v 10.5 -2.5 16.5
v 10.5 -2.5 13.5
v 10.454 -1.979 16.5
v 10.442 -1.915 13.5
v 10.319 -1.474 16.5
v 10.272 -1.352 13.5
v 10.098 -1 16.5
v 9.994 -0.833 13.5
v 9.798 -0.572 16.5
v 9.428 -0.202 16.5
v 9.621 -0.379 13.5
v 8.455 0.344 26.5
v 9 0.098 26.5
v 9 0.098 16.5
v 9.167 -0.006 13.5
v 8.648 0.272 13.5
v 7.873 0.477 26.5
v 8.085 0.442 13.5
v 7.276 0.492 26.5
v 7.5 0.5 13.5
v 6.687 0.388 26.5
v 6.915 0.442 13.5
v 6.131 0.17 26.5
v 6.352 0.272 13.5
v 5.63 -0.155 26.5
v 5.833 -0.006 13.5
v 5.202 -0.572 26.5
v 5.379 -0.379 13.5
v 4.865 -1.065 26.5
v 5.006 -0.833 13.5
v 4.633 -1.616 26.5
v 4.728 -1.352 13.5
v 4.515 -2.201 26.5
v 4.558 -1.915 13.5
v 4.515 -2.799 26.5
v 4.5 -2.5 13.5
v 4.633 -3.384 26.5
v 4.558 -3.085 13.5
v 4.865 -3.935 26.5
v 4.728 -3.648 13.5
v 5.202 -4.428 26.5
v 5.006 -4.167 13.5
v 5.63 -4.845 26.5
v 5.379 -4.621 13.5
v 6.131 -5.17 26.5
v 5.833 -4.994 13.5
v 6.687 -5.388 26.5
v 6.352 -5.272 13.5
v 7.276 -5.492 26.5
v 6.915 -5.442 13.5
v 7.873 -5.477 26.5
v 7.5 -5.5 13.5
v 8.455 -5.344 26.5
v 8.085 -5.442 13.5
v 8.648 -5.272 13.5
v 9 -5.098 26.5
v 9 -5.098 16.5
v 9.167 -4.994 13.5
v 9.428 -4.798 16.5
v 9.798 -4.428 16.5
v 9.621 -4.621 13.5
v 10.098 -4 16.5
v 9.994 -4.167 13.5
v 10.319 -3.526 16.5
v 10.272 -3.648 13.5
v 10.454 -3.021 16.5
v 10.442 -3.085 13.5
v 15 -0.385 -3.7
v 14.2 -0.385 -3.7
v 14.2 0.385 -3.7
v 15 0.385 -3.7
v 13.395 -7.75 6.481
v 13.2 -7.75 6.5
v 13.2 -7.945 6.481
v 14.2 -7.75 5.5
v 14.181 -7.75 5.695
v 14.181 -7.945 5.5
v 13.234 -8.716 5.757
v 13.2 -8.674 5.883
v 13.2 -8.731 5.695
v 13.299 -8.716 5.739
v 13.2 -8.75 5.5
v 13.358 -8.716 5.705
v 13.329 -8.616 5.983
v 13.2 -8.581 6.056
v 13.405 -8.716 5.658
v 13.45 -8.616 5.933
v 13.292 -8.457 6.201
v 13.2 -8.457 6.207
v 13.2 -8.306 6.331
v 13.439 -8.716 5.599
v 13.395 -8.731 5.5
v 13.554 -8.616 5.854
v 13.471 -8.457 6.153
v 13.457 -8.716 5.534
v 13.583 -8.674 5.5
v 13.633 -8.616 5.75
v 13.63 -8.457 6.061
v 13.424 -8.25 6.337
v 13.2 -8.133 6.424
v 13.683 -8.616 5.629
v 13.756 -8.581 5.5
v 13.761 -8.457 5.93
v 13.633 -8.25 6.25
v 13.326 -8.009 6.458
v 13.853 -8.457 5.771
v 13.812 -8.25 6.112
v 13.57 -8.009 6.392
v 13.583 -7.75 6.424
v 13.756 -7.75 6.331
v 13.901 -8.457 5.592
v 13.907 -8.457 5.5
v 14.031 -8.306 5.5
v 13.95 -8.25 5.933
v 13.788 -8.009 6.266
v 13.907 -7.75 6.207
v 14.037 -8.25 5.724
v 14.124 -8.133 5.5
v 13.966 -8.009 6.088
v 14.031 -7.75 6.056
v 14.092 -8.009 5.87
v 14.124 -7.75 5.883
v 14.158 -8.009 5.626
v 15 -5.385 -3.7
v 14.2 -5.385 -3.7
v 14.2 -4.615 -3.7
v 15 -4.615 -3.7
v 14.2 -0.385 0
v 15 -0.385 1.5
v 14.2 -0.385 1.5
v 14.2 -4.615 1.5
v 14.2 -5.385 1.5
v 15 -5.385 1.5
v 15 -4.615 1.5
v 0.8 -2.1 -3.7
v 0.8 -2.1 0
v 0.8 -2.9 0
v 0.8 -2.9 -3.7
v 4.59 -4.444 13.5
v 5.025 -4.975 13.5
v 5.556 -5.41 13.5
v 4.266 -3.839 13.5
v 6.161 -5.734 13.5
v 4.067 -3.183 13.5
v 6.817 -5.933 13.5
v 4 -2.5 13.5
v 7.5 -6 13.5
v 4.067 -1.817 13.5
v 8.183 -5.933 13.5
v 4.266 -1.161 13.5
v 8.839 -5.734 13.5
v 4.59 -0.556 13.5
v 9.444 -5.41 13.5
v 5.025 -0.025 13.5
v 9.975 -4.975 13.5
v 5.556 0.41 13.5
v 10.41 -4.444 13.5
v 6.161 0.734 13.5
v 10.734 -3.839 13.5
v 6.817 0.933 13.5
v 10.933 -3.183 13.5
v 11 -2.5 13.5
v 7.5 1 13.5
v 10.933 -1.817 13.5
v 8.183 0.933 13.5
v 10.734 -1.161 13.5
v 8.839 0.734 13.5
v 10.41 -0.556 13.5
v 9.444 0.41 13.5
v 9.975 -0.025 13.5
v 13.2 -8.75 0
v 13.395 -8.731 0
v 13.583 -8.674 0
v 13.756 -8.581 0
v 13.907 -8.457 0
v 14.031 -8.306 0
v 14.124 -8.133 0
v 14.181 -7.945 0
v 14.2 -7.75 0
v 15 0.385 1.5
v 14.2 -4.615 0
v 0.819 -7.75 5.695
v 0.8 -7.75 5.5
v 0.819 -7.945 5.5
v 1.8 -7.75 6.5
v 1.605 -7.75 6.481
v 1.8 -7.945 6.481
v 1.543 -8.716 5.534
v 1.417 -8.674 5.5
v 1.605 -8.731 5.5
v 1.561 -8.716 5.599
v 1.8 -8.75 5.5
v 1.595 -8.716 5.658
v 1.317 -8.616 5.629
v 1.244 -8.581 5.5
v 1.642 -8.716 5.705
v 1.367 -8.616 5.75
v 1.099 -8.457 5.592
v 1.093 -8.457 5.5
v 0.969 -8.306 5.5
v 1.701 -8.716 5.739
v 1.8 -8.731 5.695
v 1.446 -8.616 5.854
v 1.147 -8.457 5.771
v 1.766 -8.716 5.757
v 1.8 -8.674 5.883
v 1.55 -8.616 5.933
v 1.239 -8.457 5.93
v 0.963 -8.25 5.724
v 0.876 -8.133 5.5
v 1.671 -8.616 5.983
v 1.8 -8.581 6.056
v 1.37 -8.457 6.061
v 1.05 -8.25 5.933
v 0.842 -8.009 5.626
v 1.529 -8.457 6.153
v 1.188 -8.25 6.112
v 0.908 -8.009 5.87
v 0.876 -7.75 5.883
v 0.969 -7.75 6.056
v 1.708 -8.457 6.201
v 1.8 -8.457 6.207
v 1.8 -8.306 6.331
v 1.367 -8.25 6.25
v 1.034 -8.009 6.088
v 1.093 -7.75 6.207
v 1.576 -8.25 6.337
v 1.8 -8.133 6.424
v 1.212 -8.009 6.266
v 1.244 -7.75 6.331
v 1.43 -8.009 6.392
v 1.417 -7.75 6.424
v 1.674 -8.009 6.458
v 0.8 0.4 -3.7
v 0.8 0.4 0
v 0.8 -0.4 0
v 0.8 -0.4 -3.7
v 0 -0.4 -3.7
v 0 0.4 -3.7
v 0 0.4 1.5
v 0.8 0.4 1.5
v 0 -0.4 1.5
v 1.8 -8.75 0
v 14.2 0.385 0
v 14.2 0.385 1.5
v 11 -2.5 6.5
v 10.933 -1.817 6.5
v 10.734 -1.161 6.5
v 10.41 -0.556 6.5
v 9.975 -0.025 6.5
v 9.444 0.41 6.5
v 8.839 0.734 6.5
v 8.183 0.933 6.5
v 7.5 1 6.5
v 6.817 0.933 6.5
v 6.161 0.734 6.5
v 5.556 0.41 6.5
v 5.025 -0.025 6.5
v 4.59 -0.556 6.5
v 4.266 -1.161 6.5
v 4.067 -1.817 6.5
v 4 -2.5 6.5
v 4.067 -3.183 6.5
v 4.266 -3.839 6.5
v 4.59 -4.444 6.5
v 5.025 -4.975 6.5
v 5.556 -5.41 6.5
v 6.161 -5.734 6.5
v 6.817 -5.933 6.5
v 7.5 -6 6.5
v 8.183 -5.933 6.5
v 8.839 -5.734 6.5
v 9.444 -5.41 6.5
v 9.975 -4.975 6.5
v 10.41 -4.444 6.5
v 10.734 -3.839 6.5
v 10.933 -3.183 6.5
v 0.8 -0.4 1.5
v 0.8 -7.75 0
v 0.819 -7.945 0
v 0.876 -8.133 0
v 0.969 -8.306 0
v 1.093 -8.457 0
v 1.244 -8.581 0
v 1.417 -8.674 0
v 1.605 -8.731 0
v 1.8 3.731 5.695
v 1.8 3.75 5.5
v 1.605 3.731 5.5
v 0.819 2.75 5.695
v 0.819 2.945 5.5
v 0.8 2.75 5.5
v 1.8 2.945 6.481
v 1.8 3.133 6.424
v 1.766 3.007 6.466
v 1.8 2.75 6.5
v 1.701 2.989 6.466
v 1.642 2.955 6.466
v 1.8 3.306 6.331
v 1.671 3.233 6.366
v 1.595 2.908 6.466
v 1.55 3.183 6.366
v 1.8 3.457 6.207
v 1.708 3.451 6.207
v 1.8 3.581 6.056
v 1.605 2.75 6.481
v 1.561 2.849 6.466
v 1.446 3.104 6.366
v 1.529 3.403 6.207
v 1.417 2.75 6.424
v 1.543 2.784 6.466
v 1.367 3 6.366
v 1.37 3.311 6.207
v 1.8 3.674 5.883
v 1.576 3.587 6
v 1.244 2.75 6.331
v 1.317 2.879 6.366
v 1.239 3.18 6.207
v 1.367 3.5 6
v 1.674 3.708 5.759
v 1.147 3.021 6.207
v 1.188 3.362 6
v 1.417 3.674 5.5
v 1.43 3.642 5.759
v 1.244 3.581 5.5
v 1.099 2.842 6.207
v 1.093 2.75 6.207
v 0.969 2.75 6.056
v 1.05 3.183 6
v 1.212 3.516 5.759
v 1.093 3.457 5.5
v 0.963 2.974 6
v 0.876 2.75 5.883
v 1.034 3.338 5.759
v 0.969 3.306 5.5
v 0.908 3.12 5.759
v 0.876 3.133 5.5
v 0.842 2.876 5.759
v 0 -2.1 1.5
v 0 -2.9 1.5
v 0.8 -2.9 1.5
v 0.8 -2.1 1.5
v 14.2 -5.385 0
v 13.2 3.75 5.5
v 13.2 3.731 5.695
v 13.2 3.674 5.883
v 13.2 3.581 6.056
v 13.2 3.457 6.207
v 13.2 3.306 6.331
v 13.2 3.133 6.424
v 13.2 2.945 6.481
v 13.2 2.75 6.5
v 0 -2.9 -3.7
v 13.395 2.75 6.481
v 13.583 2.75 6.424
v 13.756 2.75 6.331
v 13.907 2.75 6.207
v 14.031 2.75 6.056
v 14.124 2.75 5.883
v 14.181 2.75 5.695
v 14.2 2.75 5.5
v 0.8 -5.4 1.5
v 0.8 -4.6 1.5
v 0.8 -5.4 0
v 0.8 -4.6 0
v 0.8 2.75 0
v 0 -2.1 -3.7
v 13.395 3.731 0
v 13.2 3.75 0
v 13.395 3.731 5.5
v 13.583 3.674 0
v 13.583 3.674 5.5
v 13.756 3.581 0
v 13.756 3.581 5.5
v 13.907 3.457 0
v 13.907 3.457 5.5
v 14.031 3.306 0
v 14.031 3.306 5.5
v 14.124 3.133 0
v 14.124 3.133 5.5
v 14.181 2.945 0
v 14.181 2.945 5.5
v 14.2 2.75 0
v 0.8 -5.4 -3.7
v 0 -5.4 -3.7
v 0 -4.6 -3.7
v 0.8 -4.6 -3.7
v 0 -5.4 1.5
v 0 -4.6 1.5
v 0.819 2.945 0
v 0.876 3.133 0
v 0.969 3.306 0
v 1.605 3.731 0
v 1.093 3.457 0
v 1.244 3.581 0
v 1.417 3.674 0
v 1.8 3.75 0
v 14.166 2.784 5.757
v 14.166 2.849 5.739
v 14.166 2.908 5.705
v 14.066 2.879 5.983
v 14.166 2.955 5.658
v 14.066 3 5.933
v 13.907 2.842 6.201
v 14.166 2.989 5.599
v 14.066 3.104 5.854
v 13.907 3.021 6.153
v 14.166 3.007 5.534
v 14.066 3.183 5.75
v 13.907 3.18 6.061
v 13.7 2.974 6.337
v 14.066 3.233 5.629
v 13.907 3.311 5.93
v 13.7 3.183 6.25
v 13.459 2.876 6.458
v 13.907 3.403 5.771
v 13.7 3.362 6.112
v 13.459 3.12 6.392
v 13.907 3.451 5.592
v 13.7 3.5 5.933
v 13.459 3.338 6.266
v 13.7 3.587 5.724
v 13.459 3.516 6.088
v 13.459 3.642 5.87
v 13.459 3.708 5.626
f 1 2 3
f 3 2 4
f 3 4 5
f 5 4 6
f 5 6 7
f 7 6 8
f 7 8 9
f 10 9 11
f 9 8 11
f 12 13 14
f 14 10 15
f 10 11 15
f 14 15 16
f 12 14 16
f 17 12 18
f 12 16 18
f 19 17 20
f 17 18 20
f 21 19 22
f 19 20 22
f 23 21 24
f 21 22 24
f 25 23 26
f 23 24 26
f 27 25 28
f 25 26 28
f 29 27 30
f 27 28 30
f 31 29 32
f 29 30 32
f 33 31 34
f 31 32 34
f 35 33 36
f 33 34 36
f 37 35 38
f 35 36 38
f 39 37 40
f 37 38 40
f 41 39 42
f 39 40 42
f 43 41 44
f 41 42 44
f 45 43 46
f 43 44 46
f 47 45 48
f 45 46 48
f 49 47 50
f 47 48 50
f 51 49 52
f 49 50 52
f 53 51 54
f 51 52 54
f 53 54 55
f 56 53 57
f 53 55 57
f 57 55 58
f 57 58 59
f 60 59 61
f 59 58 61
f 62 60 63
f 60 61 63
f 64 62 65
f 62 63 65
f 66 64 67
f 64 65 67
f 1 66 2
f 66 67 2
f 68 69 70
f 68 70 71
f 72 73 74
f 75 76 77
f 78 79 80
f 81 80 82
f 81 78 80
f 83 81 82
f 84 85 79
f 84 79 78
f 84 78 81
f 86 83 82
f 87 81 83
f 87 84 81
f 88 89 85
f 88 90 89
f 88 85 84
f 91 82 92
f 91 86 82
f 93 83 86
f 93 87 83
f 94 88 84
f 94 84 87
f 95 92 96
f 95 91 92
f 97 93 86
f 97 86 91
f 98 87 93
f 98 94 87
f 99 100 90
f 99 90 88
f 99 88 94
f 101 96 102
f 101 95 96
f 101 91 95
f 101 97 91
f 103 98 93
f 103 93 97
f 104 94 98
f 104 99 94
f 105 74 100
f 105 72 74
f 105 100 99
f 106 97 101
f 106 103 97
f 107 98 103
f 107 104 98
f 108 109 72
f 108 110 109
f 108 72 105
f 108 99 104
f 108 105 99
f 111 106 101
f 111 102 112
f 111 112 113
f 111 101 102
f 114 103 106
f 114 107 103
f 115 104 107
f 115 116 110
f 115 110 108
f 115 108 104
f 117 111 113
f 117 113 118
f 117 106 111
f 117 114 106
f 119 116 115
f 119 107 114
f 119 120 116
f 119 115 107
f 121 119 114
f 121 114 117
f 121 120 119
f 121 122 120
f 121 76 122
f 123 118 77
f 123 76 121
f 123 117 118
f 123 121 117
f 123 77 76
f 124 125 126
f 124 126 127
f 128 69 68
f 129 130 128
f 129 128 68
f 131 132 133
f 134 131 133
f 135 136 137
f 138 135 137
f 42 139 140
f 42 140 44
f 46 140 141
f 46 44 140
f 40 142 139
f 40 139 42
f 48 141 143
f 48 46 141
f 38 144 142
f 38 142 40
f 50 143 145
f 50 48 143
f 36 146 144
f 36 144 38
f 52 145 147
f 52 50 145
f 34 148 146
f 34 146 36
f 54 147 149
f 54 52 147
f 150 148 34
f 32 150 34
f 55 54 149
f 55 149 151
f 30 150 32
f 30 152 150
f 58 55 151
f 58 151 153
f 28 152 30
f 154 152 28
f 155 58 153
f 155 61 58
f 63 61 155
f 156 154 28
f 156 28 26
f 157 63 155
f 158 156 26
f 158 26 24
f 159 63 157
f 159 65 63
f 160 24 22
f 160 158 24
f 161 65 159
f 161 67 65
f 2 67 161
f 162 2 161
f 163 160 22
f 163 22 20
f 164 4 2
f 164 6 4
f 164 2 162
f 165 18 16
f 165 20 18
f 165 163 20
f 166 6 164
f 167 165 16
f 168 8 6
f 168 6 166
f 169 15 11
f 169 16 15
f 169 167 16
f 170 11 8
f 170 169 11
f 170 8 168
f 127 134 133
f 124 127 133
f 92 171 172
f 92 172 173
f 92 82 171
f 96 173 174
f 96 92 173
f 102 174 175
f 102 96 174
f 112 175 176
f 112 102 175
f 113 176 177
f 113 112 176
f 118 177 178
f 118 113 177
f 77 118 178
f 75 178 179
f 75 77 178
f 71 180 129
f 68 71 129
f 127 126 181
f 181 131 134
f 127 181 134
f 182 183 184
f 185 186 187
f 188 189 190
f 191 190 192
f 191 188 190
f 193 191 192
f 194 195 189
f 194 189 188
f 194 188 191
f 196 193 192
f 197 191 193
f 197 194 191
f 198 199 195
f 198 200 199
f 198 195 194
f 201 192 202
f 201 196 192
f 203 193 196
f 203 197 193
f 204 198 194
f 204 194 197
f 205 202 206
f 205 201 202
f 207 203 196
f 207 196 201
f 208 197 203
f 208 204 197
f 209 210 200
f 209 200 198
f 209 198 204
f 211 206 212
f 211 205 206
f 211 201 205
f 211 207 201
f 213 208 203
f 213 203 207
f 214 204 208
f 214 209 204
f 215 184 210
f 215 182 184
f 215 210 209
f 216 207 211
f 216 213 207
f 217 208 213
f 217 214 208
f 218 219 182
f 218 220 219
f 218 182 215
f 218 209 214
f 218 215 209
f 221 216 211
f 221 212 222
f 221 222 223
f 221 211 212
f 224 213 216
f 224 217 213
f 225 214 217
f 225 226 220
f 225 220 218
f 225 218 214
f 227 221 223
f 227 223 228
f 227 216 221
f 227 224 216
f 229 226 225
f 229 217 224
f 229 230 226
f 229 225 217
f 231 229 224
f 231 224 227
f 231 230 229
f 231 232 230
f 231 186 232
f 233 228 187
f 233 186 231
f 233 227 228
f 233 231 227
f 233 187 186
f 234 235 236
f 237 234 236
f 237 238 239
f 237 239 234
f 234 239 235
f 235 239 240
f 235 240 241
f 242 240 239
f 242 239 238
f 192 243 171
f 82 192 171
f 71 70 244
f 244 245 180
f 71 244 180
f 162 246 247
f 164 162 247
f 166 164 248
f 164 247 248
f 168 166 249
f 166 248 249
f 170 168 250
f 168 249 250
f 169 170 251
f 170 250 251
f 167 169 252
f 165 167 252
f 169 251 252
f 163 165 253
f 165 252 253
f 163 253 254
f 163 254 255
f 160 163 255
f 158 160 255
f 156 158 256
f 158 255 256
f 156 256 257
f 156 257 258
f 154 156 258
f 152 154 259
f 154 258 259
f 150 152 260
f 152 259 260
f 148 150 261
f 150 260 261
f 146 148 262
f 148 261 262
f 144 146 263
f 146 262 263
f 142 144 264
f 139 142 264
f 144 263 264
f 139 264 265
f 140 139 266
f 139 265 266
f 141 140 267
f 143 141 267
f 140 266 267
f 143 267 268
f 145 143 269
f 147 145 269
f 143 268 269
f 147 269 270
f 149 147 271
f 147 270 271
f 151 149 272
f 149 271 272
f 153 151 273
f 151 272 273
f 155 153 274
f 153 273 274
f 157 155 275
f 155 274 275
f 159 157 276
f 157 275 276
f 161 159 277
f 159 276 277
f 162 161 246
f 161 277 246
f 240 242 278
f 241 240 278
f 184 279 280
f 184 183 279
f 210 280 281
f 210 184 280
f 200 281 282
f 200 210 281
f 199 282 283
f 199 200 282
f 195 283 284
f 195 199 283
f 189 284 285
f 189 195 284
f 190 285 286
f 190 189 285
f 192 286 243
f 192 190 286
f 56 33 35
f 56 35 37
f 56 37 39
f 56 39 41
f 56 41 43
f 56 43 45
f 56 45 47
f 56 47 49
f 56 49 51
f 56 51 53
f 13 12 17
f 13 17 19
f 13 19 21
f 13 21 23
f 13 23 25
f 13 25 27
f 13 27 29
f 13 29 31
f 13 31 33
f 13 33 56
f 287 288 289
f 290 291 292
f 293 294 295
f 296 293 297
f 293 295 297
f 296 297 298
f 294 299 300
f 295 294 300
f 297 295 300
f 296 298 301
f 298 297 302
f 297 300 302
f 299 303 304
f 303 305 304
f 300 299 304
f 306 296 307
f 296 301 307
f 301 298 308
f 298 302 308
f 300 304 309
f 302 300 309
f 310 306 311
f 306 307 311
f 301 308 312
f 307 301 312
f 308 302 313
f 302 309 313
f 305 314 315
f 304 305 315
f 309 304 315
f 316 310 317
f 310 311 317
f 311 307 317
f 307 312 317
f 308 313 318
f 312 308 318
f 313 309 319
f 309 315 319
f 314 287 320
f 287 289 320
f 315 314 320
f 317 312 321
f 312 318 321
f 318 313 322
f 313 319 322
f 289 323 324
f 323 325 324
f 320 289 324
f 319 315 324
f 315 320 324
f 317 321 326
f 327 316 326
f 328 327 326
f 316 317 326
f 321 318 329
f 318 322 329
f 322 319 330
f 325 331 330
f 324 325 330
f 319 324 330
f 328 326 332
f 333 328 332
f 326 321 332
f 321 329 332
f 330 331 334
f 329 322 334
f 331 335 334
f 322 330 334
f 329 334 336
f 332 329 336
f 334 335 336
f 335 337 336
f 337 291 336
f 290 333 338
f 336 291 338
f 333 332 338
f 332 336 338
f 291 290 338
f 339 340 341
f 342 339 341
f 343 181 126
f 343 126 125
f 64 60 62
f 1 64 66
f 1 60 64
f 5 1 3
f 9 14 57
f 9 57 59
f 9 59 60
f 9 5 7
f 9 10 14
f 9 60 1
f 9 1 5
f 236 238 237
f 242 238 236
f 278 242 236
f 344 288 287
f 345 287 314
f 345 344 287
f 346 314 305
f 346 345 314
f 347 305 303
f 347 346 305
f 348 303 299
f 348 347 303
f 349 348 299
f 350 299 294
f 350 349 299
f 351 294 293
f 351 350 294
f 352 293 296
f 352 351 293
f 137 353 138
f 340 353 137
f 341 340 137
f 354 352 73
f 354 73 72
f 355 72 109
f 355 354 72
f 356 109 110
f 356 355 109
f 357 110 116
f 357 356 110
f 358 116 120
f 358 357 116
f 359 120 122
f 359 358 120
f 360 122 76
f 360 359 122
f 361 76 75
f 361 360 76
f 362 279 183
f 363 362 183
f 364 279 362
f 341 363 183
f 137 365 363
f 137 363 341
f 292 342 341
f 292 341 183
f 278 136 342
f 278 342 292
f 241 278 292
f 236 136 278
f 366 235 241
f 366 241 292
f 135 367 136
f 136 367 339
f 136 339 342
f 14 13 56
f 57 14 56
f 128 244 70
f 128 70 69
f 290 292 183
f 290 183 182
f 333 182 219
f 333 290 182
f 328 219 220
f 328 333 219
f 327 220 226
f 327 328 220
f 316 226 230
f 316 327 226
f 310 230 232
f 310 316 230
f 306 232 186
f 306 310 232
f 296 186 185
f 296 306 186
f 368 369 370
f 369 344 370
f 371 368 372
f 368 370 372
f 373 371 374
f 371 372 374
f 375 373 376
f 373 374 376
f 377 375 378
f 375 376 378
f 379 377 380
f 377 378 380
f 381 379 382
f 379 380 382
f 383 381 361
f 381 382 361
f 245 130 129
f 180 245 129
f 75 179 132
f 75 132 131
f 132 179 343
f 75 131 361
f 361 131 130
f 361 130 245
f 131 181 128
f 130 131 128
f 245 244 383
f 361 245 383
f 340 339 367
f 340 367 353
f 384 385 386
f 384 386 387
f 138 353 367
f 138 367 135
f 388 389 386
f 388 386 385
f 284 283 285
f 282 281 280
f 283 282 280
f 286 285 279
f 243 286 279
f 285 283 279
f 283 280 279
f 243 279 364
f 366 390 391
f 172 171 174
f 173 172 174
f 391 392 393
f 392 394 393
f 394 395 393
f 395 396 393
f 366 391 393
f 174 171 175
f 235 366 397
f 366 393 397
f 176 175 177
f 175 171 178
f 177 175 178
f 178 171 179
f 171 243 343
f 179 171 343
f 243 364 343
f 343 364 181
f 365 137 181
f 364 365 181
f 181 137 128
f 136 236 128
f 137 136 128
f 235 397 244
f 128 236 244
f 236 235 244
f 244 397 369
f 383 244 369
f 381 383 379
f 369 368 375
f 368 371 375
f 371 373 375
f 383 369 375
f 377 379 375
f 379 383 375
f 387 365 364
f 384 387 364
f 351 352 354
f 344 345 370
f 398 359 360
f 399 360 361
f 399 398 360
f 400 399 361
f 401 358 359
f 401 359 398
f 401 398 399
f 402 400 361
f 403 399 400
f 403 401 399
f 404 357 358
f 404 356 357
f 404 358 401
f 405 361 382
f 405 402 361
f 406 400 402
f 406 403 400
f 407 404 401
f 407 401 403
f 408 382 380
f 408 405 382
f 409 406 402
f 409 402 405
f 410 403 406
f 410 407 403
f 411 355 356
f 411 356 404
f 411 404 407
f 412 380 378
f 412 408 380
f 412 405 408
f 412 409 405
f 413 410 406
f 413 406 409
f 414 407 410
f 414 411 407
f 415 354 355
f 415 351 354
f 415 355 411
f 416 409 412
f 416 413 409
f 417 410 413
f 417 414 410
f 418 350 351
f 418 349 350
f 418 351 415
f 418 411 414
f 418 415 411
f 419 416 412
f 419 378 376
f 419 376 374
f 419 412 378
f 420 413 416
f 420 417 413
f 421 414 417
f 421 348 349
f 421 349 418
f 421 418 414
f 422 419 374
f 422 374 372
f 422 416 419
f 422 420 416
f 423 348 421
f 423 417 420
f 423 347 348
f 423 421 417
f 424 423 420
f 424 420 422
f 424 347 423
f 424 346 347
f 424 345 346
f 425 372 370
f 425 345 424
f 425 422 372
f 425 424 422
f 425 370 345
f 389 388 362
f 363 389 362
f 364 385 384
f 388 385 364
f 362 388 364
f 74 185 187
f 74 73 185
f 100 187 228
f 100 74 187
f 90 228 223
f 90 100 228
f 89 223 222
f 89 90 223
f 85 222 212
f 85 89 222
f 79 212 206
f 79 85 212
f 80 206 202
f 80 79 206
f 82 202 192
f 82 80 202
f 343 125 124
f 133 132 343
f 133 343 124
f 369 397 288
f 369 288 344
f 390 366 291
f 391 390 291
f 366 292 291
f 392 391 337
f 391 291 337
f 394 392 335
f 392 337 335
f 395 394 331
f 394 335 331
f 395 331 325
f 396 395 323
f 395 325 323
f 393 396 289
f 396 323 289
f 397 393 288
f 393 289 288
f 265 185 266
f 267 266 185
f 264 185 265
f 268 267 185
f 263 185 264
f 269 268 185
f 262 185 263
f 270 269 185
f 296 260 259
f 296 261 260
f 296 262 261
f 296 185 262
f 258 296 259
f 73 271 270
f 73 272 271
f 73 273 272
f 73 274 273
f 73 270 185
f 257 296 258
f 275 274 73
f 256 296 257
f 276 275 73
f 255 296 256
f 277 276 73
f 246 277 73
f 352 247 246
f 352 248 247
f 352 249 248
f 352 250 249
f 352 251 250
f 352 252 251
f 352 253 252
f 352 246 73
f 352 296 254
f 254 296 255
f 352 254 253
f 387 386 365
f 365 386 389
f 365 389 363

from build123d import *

# Parameters (mm, degrees)
SKETCH_W      = 13.4
SKETCH_H      = 12.5
PAD_DEPTH     = 6.5
SKETCH001_W   = 0.8
SKETCH001_H   = 0.8
SKETCH001_H_2 = 0.76989
PAD001_DEPTH  = 5.2
SKETCH002_R   = 3.5
PAD002_DEPTH  = 7
SKETCH003_R   = 3
PAD003_DEPTH  = 13
POCKET_DEPTH  = 10
FILLET_R      = 1


with BuildPart() as part:
    # Sketch → Pad (new body)
    with BuildSketch(Plane.XY):
        with Locations((7.5, -2.5)):
            Rectangle(SKETCH_W, SKETCH_H)
    extrude(amount=PAD_DEPTH)

    # Sketch001 (on DatumPlane) → Pad001 (join)
    with BuildSketch(Plane(origin=(0, 0, 1.5), x_dir=(1, 0, 0), z_dir=(0, 0, -1))):
        with Locations((0.4, 5)):
            Rectangle(SKETCH001_W, SKETCH001_H)
        with Locations((0.4, 2.5)):
            Rectangle(SKETCH001_W, SKETCH001_H)
        with Locations((0.4, 0)):
            Rectangle(SKETCH001_W, SKETCH001_H)
        with Locations((14.6, 5)):
            Rectangle(SKETCH001_W, SKETCH001_H_2)
        with Locations((14.6, 0)):
            Rectangle(SKETCH001_W, SKETCH001_H_2)
    extrude(amount=PAD001_DEPTH)

    # Sketch002 (on Face5 of Pad001) → Pad002 (join)
    with BuildSketch(Plane.XY.offset(6.5)):
        with Locations((7.5, -2.5)):
            Circle(SKETCH002_R)
    extrude(amount=PAD002_DEPTH)

    # Sketch003 (on Face38 of Pad002) → Pad003 (join)
    with BuildSketch(Plane.XY.offset(13.5)):
        with Locations((7.5, -2.5)):
            Circle(SKETCH003_R)
    extrude(amount=PAD003_DEPTH)

    # Sketch004 (on Face40 of Pad003) → Pocket (cut)
    with BuildSketch(Plane.XY.offset(26.5)):
        with BuildLine():
            Line((9, 0.098076), (9, -5.098076))
            ThreePointArc((9, -5.098076), (10.5, -2.5), (9, 0.098076))
        make_face()
    extrude(amount=-POCKET_DEPTH, mode=Mode.SUBTRACT)

    # Fillet
    fillet_edges = [part.edges().sort_by_distance(p)[0] for p in [
        (0.8, 3.75, 3.25),
        (7.5, 3.75, 6.5),
        (0.8, -2.5, 6.5),
        (14.2, -2.5, 6.5),
        (14.2, 3.75, 3.25),
        (0.8, -8.75, 3.25),
        (7.5, -8.75, 6.5),
        (14.2, -8.75, 3.25),
    ]]
    fillet(fillet_edges, radius=FILLET_R)


solid = part.part
